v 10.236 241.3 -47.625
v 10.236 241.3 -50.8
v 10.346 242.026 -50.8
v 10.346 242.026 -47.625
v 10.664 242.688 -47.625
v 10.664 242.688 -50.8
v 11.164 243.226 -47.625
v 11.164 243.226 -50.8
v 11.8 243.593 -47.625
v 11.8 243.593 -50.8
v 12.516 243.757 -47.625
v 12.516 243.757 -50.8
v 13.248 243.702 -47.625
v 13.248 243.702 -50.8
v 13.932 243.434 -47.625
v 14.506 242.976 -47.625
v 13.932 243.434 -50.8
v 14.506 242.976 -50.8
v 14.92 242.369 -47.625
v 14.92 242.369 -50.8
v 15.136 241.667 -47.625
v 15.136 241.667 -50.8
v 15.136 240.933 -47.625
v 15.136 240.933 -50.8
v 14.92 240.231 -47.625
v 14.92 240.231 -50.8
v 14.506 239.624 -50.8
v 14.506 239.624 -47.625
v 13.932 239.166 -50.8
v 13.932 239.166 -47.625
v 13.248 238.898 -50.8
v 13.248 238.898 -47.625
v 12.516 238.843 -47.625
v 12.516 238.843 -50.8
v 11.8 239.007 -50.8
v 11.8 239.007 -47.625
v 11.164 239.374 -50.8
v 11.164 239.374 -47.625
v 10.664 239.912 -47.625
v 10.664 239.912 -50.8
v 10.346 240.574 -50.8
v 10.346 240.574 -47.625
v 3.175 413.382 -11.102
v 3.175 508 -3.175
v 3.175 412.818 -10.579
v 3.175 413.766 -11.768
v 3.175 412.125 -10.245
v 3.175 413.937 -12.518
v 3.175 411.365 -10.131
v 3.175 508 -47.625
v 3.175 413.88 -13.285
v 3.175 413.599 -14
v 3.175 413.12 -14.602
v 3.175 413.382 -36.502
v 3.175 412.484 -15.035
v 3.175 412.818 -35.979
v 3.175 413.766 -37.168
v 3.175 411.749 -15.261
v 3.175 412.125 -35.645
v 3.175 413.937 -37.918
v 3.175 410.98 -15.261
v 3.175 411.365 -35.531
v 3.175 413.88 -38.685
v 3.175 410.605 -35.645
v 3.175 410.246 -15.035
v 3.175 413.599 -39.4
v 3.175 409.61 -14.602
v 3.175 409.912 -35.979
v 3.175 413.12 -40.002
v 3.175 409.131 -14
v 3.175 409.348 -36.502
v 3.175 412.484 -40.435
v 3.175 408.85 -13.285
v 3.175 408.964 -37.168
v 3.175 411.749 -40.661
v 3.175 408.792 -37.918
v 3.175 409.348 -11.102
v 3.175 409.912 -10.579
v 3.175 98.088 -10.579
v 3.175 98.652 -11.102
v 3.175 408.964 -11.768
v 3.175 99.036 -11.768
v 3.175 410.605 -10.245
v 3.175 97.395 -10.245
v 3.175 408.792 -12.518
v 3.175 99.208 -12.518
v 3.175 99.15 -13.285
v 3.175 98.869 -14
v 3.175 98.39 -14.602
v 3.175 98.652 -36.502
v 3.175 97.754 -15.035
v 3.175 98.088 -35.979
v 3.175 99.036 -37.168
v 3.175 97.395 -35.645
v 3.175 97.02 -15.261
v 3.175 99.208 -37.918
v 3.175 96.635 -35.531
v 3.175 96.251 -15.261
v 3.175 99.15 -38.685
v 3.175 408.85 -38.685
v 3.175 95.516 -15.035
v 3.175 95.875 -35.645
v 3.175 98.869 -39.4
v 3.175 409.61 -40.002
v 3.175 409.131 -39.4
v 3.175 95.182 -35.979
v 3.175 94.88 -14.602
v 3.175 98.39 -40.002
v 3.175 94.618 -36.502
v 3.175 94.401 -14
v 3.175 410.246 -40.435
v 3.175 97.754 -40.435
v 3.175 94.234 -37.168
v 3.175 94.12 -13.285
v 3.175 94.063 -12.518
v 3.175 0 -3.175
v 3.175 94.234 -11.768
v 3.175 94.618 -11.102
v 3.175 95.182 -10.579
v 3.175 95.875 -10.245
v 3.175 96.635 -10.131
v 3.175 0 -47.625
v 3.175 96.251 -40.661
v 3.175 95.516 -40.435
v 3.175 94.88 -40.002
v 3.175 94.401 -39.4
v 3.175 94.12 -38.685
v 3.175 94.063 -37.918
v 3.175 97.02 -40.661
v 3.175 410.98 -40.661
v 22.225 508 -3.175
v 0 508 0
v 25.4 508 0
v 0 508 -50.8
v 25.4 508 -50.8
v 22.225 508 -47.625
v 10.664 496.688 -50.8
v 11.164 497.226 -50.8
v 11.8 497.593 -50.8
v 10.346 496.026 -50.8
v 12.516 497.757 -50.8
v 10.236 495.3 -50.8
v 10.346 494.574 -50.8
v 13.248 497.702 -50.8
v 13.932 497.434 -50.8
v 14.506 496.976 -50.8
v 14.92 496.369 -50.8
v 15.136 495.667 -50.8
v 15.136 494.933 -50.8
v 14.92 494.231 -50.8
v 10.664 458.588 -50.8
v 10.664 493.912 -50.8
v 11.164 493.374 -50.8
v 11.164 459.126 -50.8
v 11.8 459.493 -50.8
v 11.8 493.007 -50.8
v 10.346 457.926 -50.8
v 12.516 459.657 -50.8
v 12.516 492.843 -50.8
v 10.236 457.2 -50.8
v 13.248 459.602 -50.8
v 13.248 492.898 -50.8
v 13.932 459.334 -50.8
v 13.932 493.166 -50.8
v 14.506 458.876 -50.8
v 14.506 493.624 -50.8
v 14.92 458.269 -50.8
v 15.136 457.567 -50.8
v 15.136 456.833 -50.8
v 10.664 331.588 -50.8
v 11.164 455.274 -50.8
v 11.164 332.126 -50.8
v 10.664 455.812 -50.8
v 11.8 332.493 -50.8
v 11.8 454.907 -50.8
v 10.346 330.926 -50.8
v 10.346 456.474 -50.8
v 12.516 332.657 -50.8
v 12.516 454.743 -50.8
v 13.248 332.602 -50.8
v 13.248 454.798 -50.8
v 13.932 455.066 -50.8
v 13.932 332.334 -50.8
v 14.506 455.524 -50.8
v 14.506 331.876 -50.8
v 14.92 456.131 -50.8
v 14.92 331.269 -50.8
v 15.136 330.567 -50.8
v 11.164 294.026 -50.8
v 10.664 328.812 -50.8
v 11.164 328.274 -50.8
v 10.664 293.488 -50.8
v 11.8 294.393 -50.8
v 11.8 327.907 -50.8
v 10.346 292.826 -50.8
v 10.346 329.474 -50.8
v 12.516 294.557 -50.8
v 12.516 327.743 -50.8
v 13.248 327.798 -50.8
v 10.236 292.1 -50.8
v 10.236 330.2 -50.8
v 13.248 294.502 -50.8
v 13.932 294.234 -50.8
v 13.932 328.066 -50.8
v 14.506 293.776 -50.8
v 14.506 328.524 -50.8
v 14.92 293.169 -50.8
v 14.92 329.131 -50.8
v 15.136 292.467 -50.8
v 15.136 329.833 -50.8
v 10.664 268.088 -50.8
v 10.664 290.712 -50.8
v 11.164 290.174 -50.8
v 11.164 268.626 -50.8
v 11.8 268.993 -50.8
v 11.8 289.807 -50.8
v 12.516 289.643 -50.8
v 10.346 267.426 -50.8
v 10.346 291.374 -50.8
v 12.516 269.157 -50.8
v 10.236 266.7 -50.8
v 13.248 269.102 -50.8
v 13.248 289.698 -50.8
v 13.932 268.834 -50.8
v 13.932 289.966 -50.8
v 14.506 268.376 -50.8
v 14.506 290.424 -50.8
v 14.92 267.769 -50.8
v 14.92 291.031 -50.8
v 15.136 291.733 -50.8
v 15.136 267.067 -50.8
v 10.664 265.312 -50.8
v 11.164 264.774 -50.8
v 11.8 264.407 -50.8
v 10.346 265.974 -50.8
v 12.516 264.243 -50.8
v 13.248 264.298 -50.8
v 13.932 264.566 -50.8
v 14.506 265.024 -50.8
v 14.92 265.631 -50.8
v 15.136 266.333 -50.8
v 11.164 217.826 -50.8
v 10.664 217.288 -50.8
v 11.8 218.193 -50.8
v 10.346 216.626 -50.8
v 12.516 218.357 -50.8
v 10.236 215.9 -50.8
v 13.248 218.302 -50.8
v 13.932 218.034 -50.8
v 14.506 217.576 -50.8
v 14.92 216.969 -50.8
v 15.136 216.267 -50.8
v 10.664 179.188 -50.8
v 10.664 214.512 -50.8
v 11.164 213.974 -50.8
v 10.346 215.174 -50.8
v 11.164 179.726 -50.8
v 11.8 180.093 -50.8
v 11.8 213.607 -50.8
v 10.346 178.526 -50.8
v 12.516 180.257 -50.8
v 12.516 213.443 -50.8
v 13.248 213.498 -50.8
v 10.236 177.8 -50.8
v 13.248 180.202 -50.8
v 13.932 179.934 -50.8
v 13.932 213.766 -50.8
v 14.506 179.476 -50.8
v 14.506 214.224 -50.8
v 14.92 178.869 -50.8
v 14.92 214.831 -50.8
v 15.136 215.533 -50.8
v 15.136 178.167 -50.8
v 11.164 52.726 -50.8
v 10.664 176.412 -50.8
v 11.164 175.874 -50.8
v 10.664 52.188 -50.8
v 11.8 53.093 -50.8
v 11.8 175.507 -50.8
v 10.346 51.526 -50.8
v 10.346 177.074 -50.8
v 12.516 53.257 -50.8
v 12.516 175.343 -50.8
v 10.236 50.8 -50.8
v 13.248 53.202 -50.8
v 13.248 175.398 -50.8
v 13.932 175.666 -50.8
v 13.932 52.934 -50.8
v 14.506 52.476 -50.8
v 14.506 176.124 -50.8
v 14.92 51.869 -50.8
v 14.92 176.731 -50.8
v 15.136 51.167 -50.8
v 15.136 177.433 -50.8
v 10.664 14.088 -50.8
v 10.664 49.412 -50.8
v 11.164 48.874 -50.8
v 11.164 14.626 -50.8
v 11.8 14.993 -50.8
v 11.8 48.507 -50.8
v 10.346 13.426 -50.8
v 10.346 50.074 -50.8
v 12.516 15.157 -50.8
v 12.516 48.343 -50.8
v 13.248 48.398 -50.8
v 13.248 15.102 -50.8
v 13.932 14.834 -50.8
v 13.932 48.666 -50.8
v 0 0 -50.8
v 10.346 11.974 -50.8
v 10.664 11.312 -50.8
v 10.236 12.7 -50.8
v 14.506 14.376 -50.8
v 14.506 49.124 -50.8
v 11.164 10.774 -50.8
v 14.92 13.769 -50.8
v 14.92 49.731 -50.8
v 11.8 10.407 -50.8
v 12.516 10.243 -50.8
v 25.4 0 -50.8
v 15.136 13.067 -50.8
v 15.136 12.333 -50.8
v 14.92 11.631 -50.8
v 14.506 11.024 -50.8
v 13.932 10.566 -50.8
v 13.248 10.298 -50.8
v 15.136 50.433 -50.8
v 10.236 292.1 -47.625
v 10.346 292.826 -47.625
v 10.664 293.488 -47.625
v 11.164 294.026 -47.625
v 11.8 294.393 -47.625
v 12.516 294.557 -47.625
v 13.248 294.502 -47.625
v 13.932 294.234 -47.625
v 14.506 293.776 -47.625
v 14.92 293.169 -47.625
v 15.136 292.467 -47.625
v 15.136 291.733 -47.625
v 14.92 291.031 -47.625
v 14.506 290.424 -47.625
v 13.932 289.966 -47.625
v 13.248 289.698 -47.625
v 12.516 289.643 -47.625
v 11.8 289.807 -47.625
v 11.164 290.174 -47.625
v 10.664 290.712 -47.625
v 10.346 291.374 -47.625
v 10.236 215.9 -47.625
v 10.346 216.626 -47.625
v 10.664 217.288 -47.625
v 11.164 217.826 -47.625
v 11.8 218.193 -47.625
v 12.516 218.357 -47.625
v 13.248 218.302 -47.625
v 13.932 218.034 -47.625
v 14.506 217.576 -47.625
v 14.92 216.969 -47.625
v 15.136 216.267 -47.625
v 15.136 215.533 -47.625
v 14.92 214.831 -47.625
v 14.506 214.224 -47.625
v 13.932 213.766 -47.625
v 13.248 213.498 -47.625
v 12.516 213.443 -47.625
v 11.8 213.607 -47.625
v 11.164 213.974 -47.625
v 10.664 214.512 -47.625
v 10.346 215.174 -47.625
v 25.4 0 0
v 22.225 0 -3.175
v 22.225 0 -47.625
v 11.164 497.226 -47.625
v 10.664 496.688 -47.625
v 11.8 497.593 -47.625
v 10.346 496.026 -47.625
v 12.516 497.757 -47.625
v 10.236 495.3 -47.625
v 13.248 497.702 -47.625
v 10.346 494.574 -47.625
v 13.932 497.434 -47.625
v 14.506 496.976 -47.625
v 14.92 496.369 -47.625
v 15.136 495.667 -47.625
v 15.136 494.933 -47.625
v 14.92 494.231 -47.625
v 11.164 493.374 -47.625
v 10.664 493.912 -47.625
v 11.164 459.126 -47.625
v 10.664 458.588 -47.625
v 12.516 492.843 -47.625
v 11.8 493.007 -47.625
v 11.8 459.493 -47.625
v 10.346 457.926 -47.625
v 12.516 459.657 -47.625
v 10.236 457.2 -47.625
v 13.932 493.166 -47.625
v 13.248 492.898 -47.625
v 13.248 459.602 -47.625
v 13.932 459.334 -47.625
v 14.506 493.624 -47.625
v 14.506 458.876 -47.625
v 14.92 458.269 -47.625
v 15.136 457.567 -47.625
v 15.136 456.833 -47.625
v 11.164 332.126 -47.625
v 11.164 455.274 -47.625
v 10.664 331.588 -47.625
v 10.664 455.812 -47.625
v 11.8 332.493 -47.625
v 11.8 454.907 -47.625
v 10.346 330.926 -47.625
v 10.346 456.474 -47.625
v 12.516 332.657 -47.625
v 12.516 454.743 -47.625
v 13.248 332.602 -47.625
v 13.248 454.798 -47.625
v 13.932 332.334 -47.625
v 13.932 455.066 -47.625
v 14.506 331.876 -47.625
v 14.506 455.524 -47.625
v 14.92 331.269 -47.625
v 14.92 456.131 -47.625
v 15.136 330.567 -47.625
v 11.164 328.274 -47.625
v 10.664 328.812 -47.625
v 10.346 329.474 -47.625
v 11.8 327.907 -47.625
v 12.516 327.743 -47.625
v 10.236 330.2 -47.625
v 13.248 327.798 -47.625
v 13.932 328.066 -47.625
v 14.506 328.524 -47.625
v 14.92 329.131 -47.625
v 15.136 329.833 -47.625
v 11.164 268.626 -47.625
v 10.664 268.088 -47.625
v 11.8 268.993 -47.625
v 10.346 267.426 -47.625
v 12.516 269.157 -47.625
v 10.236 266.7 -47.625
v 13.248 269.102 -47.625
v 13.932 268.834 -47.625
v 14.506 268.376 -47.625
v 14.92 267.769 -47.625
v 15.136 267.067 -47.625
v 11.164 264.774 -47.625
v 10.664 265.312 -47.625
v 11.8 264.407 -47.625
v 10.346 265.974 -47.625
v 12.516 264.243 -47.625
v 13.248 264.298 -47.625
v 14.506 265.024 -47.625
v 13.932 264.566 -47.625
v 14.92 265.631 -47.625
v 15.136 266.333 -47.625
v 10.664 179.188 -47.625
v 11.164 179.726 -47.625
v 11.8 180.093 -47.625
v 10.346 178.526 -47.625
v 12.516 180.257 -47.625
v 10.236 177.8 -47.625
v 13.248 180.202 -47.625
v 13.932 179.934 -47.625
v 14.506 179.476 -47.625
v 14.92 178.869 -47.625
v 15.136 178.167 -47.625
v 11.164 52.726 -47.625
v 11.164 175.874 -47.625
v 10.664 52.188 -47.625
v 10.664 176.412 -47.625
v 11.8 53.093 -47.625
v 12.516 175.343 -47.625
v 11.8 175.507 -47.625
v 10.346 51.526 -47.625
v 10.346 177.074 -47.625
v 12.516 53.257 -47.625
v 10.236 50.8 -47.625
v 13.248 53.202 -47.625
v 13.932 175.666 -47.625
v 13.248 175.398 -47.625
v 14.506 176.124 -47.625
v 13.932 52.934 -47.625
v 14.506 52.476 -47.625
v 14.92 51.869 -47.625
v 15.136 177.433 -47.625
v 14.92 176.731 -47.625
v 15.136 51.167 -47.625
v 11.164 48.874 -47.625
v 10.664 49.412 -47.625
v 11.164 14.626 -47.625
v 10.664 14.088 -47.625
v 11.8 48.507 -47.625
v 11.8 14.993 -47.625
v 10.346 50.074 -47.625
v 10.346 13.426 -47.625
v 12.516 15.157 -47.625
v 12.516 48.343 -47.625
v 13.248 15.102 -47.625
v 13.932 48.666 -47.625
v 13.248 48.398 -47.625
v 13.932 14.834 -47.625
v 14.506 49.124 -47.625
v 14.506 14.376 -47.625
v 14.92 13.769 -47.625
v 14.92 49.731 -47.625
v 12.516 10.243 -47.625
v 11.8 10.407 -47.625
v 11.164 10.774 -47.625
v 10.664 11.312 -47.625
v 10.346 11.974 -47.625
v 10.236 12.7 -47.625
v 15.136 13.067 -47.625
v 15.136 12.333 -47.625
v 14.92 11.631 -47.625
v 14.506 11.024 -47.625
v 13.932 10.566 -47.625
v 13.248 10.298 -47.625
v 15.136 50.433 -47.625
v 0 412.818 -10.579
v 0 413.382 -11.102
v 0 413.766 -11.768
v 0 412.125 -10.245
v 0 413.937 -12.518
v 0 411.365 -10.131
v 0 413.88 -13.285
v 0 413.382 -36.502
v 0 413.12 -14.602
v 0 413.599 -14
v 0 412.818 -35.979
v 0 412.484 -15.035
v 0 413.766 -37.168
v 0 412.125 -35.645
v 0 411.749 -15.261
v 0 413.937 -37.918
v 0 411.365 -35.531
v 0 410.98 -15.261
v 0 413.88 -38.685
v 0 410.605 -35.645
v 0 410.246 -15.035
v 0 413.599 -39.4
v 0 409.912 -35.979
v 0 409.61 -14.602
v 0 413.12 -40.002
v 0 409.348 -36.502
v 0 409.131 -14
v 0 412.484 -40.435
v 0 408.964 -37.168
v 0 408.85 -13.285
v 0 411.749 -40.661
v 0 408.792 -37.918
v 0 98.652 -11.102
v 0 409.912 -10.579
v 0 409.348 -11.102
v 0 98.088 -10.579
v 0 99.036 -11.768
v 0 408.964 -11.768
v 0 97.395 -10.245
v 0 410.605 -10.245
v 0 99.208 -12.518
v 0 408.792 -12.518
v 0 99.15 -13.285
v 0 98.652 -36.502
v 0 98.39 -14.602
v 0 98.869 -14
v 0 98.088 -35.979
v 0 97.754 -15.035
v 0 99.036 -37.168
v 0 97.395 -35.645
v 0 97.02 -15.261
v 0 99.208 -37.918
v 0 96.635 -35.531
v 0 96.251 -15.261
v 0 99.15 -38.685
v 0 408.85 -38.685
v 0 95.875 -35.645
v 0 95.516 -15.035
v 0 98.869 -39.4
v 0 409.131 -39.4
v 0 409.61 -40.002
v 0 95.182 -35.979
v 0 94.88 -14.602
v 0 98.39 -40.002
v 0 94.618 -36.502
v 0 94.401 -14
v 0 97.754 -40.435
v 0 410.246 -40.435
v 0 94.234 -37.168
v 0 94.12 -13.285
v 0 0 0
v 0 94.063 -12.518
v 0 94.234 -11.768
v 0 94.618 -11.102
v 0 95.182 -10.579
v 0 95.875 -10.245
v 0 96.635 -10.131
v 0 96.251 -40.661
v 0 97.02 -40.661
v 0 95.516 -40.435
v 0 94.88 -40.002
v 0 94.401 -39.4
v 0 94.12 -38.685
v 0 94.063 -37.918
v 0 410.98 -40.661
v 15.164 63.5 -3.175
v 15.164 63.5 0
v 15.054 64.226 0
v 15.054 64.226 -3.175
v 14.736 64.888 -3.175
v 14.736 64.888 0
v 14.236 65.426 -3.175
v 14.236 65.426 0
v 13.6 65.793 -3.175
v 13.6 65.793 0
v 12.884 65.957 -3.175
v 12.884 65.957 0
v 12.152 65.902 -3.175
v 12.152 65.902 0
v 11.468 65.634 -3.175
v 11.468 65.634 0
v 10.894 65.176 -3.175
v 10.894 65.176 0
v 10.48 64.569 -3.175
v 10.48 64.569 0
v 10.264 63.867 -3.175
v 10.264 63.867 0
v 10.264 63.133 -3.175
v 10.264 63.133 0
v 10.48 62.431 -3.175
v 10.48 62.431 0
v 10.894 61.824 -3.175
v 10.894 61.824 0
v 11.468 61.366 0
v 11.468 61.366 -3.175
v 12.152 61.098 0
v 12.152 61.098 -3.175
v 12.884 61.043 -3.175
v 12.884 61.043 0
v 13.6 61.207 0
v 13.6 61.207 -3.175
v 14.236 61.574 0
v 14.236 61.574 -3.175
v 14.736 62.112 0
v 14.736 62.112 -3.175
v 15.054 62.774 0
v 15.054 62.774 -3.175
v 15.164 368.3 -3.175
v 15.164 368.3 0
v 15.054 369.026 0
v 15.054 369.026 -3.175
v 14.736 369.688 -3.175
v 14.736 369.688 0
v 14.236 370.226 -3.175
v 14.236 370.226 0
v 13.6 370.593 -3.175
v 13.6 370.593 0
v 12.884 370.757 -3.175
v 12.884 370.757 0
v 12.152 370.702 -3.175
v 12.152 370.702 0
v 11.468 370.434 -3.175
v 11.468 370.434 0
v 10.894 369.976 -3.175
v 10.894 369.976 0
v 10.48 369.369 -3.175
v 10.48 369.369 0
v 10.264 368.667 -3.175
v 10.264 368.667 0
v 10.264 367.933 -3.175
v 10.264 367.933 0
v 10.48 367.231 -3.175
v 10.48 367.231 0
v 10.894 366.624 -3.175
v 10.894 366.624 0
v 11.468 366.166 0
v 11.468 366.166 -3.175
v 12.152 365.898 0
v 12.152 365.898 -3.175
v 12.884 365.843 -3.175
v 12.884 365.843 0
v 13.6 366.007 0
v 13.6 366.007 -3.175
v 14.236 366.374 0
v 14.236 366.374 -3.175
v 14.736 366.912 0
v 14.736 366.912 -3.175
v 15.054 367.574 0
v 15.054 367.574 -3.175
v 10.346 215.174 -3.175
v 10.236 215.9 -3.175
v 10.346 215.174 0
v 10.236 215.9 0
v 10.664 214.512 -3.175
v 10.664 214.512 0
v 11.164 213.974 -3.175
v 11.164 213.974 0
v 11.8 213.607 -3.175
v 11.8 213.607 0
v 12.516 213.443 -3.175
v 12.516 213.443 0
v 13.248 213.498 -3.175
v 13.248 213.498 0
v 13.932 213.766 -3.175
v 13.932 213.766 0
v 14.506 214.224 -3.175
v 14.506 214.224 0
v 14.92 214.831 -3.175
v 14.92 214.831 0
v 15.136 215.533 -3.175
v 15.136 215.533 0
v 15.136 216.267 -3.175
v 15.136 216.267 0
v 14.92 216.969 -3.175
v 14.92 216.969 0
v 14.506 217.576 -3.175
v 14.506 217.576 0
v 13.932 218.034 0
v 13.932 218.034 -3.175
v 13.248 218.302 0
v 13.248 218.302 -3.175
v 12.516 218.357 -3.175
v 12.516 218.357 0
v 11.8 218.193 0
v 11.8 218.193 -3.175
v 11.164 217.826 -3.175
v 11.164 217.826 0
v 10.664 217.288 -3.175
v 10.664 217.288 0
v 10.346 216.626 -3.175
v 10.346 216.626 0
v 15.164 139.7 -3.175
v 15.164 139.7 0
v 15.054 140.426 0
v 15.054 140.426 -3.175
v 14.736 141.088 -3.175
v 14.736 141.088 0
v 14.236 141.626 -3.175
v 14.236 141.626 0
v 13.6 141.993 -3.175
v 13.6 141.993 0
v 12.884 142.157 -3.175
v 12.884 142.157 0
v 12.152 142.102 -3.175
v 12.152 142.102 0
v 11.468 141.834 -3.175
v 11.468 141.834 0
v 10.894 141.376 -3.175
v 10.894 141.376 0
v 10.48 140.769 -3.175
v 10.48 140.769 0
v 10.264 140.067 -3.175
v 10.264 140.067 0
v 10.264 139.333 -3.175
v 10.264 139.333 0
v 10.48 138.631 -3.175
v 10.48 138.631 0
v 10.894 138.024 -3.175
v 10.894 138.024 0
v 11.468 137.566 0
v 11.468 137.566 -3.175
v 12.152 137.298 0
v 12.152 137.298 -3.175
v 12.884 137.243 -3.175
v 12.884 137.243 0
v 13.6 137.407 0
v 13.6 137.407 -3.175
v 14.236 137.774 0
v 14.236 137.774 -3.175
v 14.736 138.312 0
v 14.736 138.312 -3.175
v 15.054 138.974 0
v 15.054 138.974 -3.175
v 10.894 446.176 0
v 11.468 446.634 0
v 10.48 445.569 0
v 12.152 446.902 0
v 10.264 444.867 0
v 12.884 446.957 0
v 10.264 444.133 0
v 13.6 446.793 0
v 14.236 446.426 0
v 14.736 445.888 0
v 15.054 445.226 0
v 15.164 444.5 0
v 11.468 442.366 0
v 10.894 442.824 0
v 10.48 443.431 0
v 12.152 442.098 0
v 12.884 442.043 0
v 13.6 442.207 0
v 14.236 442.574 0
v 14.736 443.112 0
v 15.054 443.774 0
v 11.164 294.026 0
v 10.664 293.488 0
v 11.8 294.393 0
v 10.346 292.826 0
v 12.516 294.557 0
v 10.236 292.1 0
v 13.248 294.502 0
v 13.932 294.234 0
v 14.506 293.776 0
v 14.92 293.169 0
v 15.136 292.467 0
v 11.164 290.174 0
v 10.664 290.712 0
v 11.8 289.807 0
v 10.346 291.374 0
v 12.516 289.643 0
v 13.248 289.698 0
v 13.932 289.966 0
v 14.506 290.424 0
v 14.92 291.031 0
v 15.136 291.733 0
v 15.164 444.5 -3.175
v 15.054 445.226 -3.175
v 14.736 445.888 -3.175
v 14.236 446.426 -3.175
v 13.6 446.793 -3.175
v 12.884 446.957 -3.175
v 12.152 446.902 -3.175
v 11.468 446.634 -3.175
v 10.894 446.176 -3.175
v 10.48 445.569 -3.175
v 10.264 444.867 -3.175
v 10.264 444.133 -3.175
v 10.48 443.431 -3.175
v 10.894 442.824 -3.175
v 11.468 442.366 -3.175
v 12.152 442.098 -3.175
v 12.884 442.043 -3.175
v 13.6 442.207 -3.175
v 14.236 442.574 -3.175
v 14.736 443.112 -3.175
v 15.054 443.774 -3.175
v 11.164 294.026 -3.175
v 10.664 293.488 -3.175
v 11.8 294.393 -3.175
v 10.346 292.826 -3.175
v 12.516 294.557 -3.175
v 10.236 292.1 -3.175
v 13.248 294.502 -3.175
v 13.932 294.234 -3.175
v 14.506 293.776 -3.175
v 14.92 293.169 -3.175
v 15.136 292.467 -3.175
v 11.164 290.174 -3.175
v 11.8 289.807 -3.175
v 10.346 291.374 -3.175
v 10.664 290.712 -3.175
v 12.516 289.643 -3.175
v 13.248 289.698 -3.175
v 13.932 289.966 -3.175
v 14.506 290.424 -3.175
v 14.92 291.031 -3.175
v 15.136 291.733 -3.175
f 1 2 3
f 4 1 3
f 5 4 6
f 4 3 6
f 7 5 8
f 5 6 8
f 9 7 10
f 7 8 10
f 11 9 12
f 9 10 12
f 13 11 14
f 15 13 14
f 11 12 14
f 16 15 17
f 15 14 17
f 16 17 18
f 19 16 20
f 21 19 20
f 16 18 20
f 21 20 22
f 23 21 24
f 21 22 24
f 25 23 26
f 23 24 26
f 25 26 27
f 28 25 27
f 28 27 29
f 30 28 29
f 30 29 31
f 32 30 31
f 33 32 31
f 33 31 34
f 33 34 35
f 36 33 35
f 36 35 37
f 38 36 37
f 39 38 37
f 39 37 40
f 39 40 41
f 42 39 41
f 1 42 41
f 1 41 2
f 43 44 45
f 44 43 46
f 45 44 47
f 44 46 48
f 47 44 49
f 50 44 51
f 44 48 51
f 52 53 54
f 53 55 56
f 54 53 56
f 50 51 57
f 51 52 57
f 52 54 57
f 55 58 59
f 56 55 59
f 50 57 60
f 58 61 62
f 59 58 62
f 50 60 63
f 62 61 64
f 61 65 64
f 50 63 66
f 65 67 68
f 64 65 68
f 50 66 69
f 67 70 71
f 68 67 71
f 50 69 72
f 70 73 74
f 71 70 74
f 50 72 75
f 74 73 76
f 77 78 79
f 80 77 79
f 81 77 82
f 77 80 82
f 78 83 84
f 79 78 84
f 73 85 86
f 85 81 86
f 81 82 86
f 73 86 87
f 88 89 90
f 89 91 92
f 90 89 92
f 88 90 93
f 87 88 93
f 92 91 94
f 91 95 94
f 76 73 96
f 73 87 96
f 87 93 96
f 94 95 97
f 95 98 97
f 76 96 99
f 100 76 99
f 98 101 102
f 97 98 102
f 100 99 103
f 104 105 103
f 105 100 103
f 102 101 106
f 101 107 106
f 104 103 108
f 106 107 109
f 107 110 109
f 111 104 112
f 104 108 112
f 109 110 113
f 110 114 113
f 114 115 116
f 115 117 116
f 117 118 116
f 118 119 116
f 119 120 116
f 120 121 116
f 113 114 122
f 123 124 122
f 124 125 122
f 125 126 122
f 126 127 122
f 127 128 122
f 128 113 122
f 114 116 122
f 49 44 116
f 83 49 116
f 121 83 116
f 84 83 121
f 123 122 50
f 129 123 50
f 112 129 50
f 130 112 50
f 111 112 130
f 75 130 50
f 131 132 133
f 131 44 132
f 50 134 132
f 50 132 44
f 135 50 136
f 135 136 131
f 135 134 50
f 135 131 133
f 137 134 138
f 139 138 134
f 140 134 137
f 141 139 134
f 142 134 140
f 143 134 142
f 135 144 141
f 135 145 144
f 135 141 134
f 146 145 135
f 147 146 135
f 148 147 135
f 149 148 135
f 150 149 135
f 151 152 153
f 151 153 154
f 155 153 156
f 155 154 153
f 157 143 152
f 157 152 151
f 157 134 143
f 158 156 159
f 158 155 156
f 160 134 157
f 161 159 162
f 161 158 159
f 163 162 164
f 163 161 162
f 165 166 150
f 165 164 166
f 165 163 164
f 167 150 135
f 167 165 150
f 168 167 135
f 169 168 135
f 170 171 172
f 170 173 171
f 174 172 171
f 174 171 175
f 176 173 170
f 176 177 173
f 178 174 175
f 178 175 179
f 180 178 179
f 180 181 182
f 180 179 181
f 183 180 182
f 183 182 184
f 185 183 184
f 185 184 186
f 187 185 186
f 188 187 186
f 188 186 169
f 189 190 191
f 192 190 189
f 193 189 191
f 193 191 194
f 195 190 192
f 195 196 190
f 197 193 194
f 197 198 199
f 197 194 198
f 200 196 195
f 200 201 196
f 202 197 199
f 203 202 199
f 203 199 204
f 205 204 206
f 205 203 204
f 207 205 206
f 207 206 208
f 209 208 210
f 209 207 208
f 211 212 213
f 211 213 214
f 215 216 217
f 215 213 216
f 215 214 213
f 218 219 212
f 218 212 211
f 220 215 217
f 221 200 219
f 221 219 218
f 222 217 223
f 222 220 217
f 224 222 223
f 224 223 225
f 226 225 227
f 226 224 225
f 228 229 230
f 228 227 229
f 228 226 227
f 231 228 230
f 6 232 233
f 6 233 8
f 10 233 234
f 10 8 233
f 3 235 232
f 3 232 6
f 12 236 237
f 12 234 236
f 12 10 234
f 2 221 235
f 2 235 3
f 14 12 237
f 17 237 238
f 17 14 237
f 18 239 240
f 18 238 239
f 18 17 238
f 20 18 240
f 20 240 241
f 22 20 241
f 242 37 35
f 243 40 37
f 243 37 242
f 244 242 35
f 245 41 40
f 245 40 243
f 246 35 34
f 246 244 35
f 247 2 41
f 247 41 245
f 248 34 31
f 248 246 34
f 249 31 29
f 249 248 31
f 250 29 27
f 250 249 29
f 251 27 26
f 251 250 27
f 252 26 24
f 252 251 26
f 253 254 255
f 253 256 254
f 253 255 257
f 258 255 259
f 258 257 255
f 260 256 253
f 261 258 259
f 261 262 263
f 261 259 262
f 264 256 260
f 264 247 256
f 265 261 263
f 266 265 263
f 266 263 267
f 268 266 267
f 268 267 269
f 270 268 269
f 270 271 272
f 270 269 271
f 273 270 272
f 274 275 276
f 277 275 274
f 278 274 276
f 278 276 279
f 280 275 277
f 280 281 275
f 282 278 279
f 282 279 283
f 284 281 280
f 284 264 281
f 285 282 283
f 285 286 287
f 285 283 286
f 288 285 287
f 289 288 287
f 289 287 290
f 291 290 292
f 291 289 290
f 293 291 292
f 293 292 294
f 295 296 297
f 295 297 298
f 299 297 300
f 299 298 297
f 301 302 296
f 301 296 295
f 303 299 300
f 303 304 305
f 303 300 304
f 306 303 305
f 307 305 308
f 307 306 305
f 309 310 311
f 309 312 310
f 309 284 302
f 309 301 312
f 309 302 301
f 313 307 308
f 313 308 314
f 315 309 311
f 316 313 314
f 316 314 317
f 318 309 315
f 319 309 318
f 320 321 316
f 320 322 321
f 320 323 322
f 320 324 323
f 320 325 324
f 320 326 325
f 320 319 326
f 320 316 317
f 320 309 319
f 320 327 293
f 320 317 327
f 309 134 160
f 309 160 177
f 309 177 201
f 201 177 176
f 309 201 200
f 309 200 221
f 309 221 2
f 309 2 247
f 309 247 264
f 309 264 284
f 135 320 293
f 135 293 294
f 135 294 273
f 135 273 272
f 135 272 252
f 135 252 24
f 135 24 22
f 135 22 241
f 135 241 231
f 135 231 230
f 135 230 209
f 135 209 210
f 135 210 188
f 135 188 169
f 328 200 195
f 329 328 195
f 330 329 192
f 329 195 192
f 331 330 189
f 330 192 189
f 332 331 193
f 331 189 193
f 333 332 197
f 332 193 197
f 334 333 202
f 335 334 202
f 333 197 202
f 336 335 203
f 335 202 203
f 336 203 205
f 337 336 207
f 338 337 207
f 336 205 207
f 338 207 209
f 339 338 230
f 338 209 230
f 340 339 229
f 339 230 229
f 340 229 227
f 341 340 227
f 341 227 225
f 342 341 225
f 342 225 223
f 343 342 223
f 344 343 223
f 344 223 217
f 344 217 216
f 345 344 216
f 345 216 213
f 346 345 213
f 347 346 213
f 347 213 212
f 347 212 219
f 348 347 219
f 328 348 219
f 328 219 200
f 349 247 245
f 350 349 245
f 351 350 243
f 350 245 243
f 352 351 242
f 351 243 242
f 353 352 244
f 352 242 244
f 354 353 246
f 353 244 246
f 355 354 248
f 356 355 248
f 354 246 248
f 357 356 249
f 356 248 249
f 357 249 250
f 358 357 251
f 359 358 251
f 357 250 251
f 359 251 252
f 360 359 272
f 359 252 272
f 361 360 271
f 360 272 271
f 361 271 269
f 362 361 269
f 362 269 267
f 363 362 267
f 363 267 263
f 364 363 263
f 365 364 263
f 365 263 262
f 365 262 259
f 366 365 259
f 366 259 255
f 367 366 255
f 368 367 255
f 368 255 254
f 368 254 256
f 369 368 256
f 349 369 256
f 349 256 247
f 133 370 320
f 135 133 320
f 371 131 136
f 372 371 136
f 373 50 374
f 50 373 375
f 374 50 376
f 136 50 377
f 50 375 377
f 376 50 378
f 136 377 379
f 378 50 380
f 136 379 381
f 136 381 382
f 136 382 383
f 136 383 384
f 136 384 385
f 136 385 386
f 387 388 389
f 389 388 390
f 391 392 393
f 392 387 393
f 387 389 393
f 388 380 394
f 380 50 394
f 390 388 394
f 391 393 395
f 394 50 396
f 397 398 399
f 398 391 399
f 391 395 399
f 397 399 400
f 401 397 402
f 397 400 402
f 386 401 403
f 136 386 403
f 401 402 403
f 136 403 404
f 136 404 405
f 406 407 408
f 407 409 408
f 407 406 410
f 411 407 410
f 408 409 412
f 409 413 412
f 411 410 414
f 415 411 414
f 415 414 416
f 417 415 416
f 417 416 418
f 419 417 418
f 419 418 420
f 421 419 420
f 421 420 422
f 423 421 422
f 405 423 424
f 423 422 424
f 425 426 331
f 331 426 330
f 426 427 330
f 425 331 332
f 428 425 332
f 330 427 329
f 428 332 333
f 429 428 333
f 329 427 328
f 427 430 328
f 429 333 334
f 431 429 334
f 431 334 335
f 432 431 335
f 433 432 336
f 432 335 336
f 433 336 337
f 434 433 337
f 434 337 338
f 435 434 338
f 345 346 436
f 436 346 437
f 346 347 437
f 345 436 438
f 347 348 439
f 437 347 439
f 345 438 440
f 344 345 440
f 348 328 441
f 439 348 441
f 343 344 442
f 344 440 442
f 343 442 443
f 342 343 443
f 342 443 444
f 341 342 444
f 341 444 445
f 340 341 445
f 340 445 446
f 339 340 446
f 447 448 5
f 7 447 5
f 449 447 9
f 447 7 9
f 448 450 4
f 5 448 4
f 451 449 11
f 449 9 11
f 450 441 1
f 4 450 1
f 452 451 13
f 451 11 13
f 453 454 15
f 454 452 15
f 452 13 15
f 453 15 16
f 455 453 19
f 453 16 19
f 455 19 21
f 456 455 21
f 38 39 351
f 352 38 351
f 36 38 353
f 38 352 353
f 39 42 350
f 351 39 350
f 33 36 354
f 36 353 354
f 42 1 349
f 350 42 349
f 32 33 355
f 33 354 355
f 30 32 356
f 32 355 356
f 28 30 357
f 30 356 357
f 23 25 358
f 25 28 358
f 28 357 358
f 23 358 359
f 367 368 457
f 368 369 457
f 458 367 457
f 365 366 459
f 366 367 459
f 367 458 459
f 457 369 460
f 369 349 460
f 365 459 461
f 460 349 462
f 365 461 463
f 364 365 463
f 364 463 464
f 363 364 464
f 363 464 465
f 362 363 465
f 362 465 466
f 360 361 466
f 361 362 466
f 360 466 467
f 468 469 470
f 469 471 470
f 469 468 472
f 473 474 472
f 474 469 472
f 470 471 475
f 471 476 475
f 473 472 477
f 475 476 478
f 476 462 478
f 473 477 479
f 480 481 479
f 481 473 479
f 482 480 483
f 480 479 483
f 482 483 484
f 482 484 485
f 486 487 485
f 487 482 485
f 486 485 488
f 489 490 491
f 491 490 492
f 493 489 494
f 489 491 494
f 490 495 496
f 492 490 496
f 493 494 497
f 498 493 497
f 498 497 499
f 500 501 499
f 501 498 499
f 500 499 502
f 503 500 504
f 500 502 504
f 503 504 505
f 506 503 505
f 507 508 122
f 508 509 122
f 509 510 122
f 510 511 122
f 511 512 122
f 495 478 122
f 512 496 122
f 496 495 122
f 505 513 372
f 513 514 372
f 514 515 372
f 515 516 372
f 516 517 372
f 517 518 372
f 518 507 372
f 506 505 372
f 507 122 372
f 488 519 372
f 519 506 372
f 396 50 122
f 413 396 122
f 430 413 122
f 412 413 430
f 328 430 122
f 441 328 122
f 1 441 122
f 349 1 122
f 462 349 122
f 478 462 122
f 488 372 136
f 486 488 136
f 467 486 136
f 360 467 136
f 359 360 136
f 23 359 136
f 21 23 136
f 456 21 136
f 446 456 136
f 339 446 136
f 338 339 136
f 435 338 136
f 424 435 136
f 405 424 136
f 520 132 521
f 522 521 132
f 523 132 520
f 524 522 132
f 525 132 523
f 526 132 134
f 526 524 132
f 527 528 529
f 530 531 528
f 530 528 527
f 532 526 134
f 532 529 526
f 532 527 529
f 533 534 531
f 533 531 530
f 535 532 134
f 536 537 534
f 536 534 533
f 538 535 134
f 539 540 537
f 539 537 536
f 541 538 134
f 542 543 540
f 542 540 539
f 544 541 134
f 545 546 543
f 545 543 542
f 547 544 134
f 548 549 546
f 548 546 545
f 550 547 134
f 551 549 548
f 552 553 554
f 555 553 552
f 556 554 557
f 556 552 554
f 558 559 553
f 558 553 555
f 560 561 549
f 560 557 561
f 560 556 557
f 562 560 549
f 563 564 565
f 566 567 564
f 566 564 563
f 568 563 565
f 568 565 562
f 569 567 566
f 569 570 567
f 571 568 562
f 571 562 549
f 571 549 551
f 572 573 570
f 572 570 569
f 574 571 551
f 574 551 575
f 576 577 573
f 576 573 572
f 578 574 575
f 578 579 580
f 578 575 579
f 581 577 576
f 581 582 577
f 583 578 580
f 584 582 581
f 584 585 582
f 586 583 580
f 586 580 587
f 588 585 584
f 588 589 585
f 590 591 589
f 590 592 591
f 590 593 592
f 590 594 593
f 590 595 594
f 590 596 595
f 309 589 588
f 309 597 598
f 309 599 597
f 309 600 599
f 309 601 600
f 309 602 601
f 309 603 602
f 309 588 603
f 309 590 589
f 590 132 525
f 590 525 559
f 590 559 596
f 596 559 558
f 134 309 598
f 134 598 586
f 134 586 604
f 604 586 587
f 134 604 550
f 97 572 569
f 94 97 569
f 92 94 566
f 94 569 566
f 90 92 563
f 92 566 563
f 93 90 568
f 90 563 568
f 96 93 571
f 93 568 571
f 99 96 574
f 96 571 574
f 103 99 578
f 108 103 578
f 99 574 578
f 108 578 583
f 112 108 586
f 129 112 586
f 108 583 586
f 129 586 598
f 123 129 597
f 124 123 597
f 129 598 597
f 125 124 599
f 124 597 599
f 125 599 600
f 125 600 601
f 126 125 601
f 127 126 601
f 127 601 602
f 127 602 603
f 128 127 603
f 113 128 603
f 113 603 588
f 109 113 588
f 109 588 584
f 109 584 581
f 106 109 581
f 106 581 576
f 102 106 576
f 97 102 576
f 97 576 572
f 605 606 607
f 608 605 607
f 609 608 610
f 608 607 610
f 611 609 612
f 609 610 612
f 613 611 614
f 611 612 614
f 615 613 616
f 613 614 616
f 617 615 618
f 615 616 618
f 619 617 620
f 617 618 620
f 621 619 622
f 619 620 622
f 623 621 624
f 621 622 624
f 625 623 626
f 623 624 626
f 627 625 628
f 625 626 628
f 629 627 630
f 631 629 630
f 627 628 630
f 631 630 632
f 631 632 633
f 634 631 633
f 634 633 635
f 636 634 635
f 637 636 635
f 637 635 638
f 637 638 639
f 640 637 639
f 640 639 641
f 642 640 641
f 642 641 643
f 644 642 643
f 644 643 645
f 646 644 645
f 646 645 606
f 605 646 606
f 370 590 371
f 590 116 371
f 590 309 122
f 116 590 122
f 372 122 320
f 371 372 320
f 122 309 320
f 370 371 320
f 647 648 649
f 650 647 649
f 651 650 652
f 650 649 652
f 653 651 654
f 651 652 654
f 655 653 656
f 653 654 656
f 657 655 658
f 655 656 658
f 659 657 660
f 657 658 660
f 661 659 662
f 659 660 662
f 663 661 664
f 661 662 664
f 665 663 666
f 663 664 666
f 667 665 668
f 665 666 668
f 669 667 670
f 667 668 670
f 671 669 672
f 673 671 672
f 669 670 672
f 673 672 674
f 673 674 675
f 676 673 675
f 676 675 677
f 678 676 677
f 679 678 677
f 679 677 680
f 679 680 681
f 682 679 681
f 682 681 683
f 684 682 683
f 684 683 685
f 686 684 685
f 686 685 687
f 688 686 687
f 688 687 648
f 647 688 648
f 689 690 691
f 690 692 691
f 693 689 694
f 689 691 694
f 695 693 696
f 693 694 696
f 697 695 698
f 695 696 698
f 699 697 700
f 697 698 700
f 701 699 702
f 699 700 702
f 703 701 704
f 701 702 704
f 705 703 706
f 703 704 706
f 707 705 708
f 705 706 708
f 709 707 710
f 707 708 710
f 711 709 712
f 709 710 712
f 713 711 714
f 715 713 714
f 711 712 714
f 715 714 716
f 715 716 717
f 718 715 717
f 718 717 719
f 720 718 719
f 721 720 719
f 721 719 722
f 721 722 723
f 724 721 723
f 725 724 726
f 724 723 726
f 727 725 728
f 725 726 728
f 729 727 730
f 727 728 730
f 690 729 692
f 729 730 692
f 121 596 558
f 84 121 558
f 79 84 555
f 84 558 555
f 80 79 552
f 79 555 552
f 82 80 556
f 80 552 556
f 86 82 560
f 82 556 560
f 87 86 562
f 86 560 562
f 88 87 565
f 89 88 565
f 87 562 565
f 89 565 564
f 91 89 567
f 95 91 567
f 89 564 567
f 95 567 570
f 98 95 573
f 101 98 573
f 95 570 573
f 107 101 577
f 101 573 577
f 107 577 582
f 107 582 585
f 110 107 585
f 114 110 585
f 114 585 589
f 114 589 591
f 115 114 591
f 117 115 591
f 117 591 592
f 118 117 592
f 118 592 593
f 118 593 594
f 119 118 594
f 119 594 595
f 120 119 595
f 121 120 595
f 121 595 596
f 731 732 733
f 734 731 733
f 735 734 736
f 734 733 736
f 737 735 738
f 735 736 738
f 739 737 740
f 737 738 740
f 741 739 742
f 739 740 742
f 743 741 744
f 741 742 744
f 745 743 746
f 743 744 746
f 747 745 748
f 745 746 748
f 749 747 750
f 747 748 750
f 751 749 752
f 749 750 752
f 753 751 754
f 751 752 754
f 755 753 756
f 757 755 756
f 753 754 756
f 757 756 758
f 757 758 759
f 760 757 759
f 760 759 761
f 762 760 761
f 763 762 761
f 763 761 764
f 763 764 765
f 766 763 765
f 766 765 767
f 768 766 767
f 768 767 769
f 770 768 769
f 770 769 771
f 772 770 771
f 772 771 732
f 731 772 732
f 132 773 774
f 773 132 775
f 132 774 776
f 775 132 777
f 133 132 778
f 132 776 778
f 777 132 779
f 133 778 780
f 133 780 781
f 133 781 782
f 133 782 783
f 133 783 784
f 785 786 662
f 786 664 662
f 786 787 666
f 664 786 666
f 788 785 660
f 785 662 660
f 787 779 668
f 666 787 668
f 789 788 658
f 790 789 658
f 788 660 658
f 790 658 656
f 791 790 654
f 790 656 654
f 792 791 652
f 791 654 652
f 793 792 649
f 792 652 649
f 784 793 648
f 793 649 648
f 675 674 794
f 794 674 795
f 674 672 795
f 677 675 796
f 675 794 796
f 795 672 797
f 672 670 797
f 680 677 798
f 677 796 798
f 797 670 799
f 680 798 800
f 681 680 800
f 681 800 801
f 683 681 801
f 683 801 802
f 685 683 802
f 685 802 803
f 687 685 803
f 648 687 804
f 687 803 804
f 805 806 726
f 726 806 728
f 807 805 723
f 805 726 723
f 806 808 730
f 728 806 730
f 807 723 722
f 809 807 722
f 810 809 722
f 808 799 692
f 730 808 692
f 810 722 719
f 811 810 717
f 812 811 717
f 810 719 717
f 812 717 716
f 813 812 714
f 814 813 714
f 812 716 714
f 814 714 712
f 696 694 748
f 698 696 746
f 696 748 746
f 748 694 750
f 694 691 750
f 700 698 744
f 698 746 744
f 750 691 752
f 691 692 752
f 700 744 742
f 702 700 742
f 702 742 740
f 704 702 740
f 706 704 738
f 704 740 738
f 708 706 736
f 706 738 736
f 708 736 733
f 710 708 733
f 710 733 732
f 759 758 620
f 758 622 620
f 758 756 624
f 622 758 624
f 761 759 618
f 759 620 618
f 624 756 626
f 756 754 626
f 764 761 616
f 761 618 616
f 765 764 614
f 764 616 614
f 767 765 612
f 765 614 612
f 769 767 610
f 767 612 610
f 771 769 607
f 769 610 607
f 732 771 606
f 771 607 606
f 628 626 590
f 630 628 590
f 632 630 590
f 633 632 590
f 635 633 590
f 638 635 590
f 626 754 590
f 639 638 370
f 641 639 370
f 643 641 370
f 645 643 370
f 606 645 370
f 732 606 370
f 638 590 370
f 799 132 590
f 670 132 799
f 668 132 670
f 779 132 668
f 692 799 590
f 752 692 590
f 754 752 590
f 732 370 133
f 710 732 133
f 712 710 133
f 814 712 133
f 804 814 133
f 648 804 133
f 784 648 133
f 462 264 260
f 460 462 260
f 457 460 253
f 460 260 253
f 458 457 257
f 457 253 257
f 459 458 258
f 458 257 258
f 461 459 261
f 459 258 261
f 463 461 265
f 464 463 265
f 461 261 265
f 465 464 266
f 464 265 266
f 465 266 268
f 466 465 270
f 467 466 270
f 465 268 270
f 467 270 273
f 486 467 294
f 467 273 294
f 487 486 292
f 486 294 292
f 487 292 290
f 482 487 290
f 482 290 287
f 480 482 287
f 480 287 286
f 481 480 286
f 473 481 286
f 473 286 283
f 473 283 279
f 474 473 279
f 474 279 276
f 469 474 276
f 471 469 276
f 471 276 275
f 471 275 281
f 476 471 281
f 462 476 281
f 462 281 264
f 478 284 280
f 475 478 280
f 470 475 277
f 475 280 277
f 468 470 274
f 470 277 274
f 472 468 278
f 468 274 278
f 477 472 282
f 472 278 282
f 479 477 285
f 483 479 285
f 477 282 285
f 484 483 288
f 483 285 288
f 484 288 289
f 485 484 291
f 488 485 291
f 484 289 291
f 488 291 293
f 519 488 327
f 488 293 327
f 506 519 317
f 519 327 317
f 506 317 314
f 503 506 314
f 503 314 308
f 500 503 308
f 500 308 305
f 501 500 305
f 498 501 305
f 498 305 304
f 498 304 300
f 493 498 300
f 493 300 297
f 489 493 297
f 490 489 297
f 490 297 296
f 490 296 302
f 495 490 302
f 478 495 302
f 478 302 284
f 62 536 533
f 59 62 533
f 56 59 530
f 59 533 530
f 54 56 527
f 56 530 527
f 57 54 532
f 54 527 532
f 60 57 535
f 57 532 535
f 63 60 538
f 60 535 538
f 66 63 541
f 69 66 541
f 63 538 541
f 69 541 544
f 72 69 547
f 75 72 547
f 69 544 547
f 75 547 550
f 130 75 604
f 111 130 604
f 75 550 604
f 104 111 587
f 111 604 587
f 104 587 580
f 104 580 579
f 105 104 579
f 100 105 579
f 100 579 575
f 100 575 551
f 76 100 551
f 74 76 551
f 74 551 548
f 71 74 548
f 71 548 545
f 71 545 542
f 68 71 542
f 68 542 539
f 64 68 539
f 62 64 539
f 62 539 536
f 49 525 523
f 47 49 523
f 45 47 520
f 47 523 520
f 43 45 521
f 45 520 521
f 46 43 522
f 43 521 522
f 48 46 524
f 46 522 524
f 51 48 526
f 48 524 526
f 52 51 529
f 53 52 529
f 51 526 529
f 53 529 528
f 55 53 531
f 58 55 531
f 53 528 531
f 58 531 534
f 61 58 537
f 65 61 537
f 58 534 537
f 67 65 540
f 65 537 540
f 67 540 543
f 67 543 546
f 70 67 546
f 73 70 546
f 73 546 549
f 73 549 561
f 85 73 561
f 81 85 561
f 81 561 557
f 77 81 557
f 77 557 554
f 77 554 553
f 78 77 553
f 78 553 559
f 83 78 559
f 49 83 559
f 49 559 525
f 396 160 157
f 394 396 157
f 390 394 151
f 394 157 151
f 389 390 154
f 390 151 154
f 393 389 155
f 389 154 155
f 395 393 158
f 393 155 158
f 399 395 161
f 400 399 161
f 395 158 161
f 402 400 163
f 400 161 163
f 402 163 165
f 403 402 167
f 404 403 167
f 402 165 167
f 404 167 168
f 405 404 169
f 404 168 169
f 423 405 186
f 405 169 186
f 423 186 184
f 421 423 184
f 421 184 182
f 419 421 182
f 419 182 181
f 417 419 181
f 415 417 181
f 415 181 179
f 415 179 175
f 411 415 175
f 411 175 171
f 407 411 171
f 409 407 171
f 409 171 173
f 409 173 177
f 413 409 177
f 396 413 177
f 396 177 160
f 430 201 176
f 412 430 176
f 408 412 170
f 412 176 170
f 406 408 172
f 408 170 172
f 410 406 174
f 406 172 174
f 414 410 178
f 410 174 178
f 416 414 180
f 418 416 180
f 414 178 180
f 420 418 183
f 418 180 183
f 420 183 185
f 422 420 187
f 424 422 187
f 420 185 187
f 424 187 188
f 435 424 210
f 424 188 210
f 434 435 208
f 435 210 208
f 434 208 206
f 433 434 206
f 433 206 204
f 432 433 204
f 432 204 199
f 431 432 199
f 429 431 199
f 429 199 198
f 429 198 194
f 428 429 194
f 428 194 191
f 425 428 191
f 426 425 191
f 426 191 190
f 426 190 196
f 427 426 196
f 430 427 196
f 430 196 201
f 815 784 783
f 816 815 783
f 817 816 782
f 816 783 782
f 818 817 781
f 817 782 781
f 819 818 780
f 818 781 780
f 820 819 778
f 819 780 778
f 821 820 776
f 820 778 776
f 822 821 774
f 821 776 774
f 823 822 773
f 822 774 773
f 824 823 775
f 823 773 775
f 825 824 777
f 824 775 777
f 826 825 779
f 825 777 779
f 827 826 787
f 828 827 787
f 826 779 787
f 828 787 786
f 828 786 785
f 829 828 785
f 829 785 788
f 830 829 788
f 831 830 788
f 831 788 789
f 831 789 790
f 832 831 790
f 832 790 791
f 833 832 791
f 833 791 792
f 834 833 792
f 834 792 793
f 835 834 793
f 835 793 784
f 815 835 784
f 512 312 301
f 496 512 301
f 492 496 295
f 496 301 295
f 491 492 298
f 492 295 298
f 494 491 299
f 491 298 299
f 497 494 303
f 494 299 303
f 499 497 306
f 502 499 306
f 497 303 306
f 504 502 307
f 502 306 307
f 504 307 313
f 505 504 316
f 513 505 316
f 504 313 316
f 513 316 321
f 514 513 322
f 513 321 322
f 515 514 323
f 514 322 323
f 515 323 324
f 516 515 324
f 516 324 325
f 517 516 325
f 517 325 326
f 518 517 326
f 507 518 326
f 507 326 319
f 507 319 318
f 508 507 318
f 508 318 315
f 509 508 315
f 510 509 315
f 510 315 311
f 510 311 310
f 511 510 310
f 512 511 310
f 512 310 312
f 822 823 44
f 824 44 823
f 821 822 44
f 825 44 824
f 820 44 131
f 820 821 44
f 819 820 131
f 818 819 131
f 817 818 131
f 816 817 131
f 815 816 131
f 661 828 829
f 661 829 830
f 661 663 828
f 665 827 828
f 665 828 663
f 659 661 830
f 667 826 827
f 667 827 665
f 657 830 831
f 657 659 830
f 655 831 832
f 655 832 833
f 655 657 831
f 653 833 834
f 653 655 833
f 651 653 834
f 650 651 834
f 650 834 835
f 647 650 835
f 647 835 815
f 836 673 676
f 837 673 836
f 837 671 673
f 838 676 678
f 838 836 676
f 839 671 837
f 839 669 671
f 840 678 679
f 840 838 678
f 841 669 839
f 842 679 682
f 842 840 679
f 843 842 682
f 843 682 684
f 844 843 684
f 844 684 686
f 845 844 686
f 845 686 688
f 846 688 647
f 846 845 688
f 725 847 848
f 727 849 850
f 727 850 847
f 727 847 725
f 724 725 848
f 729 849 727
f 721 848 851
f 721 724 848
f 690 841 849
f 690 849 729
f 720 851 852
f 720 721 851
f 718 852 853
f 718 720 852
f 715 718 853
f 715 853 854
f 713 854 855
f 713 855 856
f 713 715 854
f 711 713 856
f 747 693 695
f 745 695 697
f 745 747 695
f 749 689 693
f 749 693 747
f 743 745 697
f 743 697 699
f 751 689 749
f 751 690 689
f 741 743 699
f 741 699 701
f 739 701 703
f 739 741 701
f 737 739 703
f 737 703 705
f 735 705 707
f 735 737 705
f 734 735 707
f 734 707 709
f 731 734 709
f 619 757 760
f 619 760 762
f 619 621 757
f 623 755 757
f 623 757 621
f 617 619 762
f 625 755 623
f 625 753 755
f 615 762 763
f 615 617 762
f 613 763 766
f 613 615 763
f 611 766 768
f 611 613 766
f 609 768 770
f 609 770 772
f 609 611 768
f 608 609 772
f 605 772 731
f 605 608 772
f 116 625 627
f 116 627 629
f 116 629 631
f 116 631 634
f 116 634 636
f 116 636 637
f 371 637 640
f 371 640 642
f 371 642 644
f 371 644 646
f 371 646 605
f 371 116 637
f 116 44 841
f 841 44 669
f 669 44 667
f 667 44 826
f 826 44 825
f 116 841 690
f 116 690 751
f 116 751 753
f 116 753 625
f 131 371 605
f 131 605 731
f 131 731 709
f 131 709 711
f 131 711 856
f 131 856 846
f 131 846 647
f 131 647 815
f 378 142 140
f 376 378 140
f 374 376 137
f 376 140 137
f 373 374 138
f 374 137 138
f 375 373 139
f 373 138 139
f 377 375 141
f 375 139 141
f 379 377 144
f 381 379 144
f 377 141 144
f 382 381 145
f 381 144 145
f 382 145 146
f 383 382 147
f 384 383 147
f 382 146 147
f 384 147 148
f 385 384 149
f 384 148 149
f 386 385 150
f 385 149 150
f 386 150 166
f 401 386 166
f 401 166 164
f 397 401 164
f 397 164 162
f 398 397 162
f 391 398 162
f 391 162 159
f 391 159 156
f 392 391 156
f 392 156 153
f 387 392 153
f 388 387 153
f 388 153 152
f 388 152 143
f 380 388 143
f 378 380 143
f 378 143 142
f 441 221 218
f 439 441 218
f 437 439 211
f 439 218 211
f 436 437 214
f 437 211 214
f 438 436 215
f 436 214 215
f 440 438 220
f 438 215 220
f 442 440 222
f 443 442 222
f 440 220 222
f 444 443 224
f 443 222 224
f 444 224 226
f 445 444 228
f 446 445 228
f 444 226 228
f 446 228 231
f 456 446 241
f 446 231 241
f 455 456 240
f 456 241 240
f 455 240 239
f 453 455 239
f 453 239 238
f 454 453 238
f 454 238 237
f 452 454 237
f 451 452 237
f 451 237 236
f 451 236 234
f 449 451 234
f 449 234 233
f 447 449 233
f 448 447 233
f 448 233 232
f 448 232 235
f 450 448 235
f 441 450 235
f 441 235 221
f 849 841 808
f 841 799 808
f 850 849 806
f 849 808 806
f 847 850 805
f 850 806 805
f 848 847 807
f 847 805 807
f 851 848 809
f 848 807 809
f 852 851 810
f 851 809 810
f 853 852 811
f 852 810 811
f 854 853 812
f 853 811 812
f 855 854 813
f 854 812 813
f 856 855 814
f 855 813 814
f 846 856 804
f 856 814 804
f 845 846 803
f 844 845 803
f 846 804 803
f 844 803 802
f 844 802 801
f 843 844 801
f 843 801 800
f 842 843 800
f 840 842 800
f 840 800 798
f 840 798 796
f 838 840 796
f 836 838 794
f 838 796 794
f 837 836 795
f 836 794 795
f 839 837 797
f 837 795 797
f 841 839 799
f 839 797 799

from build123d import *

# Parameters (mm, degrees)
SKETCH1_W           = 25.4
SKETCH1_H           = 50.8
SKETCH1_W_2         = 19.05
SKETCH1_H_2         = 44.45
BOSS_EXTRUDE1_DEPTH = 508
CUT_EXTRUDE1_REACH  = 513.165
SKETCH2_R           = 2.4638
CUT_EXTRUDE2_REACH  = 513.165
SKETCH3_R           = 2.4638
CUT_EXTRUDE3_REACH  = 513.165
SKETCH4_R           = 2.5796875


with BuildPart() as part:
    # Sketch1 → Boss-Extrude1 (new body)
    with BuildSketch(Plane(origin=(0, 0, 0), x_dir=(1, 0, 0), z_dir=(0, 1, 0))):
        with Locations((12.7, 25.4)):
            Rectangle(SKETCH1_W, SKETCH1_H)
        with Locations((12.7, 25.4)):
            Rectangle(SKETCH1_W_2, SKETCH1_H_2, mode=Mode.SUBTRACT)
    extrude(amount=BOSS_EXTRUDE1_DEPTH)

    # Sketch2 → Cut-Extrude1 (cut, up to next)
    with BuildSketch(Plane(origin=(0, 0, -50.8), x_dir=(-1, 0, 0), z_dir=(0, 0, -1)), mode=Mode.PRIVATE) as cut_extrude1_sk1:
        with Locations((-12.7, 12.7)):
            Circle(SKETCH2_R)
    cut_extrude1_tool1 = extrude(cut_extrude1_sk1.sketch, amount=-CUT_EXTRUDE1_REACH, mode=Mode.PRIVATE) & part.part
    # Sketch2 → Cut-Extrude1 (cut, up to next)
    with BuildSketch(Plane(origin=(0, 0, -50.8), x_dir=(-1, 0, 0), z_dir=(0, 0, -1)), mode=Mode.PRIVATE) as cut_extrude1_sk2:
        with Locations((-12.7, 50.8)):
            Circle(SKETCH2_R)
    cut_extrude1_tool2 = extrude(cut_extrude1_sk2.sketch, amount=-CUT_EXTRUDE1_REACH, mode=Mode.PRIVATE) & part.part
    # Sketch2 → Cut-Extrude1 (cut, up to next)
    with BuildSketch(Plane(origin=(0, 0, -50.8), x_dir=(-1, 0, 0), z_dir=(0, 0, -1)), mode=Mode.PRIVATE) as cut_extrude1_sk3:
        with Locations((-12.7, 177.8)):
            Circle(SKETCH2_R)
    cut_extrude1_tool3 = extrude(cut_extrude1_sk3.sketch, amount=-CUT_EXTRUDE1_REACH, mode=Mode.PRIVATE) & part.part
    # Sketch2 → Cut-Extrude1 (cut, up to next)
    with BuildSketch(Plane(origin=(0, 0, -50.8), x_dir=(-1, 0, 0), z_dir=(0, 0, -1)), mode=Mode.PRIVATE) as cut_extrude1_sk4:
        with Locations((-12.7, 215.9)):
            Circle(SKETCH2_R)
    cut_extrude1_tool4 = extrude(cut_extrude1_sk4.sketch, amount=-CUT_EXTRUDE1_REACH, mode=Mode.PRIVATE) & part.part
    # Sketch2 → Cut-Extrude1 (cut, up to next)
    with BuildSketch(Plane(origin=(0, 0, -50.8), x_dir=(-1, 0, 0), z_dir=(0, 0, -1)), mode=Mode.PRIVATE) as cut_extrude1_sk5:
        with Locations((-12.7, 241.3)):
            Circle(SKETCH2_R)
    cut_extrude1_tool5 = extrude(cut_extrude1_sk5.sketch, amount=-CUT_EXTRUDE1_REACH, mode=Mode.PRIVATE) & part.part
    # Sketch2 → Cut-Extrude1 (cut, up to next)
    with BuildSketch(Plane(origin=(0, 0, -50.8), x_dir=(-1, 0, 0), z_dir=(0, 0, -1)), mode=Mode.PRIVATE) as cut_extrude1_sk6:
        with Locations((-12.7, 266.7)):
            Circle(SKETCH2_R)
    cut_extrude1_tool6 = extrude(cut_extrude1_sk6.sketch, amount=-CUT_EXTRUDE1_REACH, mode=Mode.PRIVATE) & part.part
    # Sketch2 → Cut-Extrude1 (cut, up to next)
    with BuildSketch(Plane(origin=(0, 0, -50.8), x_dir=(-1, 0, 0), z_dir=(0, 0, -1)), mode=Mode.PRIVATE) as cut_extrude1_sk7:
        with Locations((-12.7, 292.1)):
            Circle(SKETCH2_R)
    cut_extrude1_tool7 = extrude(cut_extrude1_sk7.sketch, amount=-CUT_EXTRUDE1_REACH, mode=Mode.PRIVATE) & part.part
    # Sketch2 → Cut-Extrude1 (cut, up to next)
    with BuildSketch(Plane(origin=(0, 0, -50.8), x_dir=(-1, 0, 0), z_dir=(0, 0, -1)), mode=Mode.PRIVATE) as cut_extrude1_sk8:
        with Locations((-12.7, 330.2)):
            Circle(SKETCH2_R)
    cut_extrude1_tool8 = extrude(cut_extrude1_sk8.sketch, amount=-CUT_EXTRUDE1_REACH, mode=Mode.PRIVATE) & part.part
    # Sketch2 → Cut-Extrude1 (cut, up to next)
    with BuildSketch(Plane(origin=(0, 0, -50.8), x_dir=(-1, 0, 0), z_dir=(0, 0, -1)), mode=Mode.PRIVATE) as cut_extrude1_sk9:
        with Locations((-12.7, 457.2)):
            Circle(SKETCH2_R)
    cut_extrude1_tool9 = extrude(cut_extrude1_sk9.sketch, amount=-CUT_EXTRUDE1_REACH, mode=Mode.PRIVATE) & part.part
    # Sketch2 → Cut-Extrude1 (cut, up to next)
    with BuildSketch(Plane(origin=(0, 0, -50.8), x_dir=(-1, 0, 0), z_dir=(0, 0, -1)), mode=Mode.PRIVATE) as cut_extrude1_sk10:
        with Locations((-12.7, 495.3)):
            Circle(SKETCH2_R)
    cut_extrude1_tool10 = extrude(cut_extrude1_sk10.sketch, amount=-CUT_EXTRUDE1_REACH, mode=Mode.PRIVATE) & part.part
    add(cut_extrude1_tool1.solids().sort_by_distance((12.7, 12.7, -50.8))[0], mode=Mode.SUBTRACT)
    add(cut_extrude1_tool2.solids().sort_by_distance((12.7, 50.8, -50.8))[0], mode=Mode.SUBTRACT)
    add(cut_extrude1_tool3.solids().sort_by_distance((12.7, 177.8, -50.8))[0], mode=Mode.SUBTRACT)
    add(cut_extrude1_tool4.solids().sort_by_distance((12.7, 215.9, -50.8))[0], mode=Mode.SUBTRACT)
    add(cut_extrude1_tool5.solids().sort_by_distance((12.7, 241.3, -50.8))[0], mode=Mode.SUBTRACT)
    add(cut_extrude1_tool6.solids().sort_by_distance((12.7, 266.7, -50.8))[0], mode=Mode.SUBTRACT)
    add(cut_extrude1_tool7.solids().sort_by_distance((12.7, 292.1, -50.8))[0], mode=Mode.SUBTRACT)
    add(cut_extrude1_tool8.solids().sort_by_distance((12.7, 330.2, -50.8))[0], mode=Mode.SUBTRACT)
    add(cut_extrude1_tool9.solids().sort_by_distance((12.7, 457.2, -50.8))[0], mode=Mode.SUBTRACT)
    add(cut_extrude1_tool10.solids().sort_by_distance((12.7, 495.3, -50.8))[0], mode=Mode.SUBTRACT)

    # Sketch3 → Cut-Extrude2 (cut, up to next)
    with BuildSketch(Plane.XY, mode=Mode.PRIVATE) as cut_extrude2_sk1:
        with Locations((12.7, 63.5)):
            Circle(SKETCH3_R)
    cut_extrude2_tool1 = extrude(cut_extrude2_sk1.sketch, amount=-CUT_EXTRUDE2_REACH, mode=Mode.PRIVATE) & part.part
    # Sketch3 → Cut-Extrude2 (cut, up to next)
    with BuildSketch(Plane.XY, mode=Mode.PRIVATE) as cut_extrude2_sk2:
        with Locations((12.7, 139.7)):
            Circle(SKETCH3_R)
    cut_extrude2_tool2 = extrude(cut_extrude2_sk2.sketch, amount=-CUT_EXTRUDE2_REACH, mode=Mode.PRIVATE) & part.part
    # Sketch3 → Cut-Extrude2 (cut, up to next)
    with BuildSketch(Plane.XY, mode=Mode.PRIVATE) as cut_extrude2_sk3:
        with Locations(Location((12.7, 215.9, 0), (0, 0, 180))):
            Circle(SKETCH3_R)
    cut_extrude2_tool3 = extrude(cut_extrude2_sk3.sketch, amount=-CUT_EXTRUDE2_REACH, mode=Mode.PRIVATE) & part.part
    # Sketch3 → Cut-Extrude2 (cut, up to next)
    with BuildSketch(Plane.XY, mode=Mode.PRIVATE) as cut_extrude2_sk4:
        with Locations(Location((12.7, 292.1, 0), (0, 0, 180))):
            Circle(SKETCH3_R)
    cut_extrude2_tool4 = extrude(cut_extrude2_sk4.sketch, amount=-CUT_EXTRUDE2_REACH, mode=Mode.PRIVATE) & part.part
    # Sketch3 → Cut-Extrude2 (cut, up to next)
    with BuildSketch(Plane.XY, mode=Mode.PRIVATE) as cut_extrude2_sk5:
        with Locations((12.7, 368.3)):
            Circle(SKETCH3_R)
    cut_extrude2_tool5 = extrude(cut_extrude2_sk5.sketch, amount=-CUT_EXTRUDE2_REACH, mode=Mode.PRIVATE) & part.part
    # Sketch3 → Cut-Extrude2 (cut, up to next)
    with BuildSketch(Plane.XY, mode=Mode.PRIVATE) as cut_extrude2_sk6:
        with Locations((12.7, 444.5)):
            Circle(SKETCH3_R)
    cut_extrude2_tool6 = extrude(cut_extrude2_sk6.sketch, amount=-CUT_EXTRUDE2_REACH, mode=Mode.PRIVATE) & part.part
    add(cut_extrude2_tool1.solids().sort_by_distance((12.7, 63.5, 0))[0], mode=Mode.SUBTRACT)
    add(cut_extrude2_tool2.solids().sort_by_distance((12.7, 139.7, 0))[0], mode=Mode.SUBTRACT)
    add(cut_extrude2_tool3.solids().sort_by_distance((12.7, 215.9, 0))[0], mode=Mode.SUBTRACT)
    add(cut_extrude2_tool4.solids().sort_by_distance((12.7, 292.1, 0))[0], mode=Mode.SUBTRACT)
    add(cut_extrude2_tool5.solids().sort_by_distance((12.7, 368.3, 0))[0], mode=Mode.SUBTRACT)
    add(cut_extrude2_tool6.solids().sort_by_distance((12.7, 444.5, 0))[0], mode=Mode.SUBTRACT)

    # Sketch4 → Cut-Extrude3 (cut, up to next)
    with BuildSketch(Plane.ZY, mode=Mode.PRIVATE) as cut_extrude3_sk1:
        with Locations((-38.110518668, 96.635101662)):
            Circle(SKETCH4_R)
    cut_extrude3_tool1 = extrude(cut_extrude3_sk1.sketch, amount=-CUT_EXTRUDE3_REACH, mode=Mode.PRIVATE) & part.part
    # Sketch4 → Cut-Extrude3 (cut, up to next)
    with BuildSketch(Plane.ZY, mode=Mode.PRIVATE) as cut_extrude3_sk2:
        with Locations((-38.110518668, 411.364898332)):
            Circle(SKETCH4_R)
    cut_extrude3_tool2 = extrude(cut_extrude3_sk2.sketch, amount=-CUT_EXTRUDE3_REACH, mode=Mode.PRIVATE) & part.part
    # Sketch4 → Cut-Extrude3 (cut, up to next)
    with BuildSketch(Plane.ZY, mode=Mode.PRIVATE) as cut_extrude3_sk3:
        with Locations((-12.710518668, 411.364898332)):
            Circle(SKETCH4_R)
    cut_extrude3_tool3 = extrude(cut_extrude3_sk3.sketch, amount=-CUT_EXTRUDE3_REACH, mode=Mode.PRIVATE) & part.part
    # Sketch4 → Cut-Extrude3 (cut, up to next)
    with BuildSketch(Plane.ZY, mode=Mode.PRIVATE) as cut_extrude3_sk4:
        with Locations((-12.710518668, 96.635101662)):
            Circle(SKETCH4_R)
    cut_extrude3_tool4 = extrude(cut_extrude3_sk4.sketch, amount=-CUT_EXTRUDE3_REACH, mode=Mode.PRIVATE) & part.part
    add(cut_extrude3_tool1.solids().sort_by_distance((0, 96.635102, -38.110519))[0], mode=Mode.SUBTRACT)
    add(cut_extrude3_tool2.solids().sort_by_distance((0, 411.364898, -38.110519))[0], mode=Mode.SUBTRACT)
    add(cut_extrude3_tool3.solids().sort_by_distance((0, 411.364898, -12.710519))[0], mode=Mode.SUBTRACT)
    add(cut_extrude3_tool4.solids().sort_by_distance((0, 96.635102, -12.710519))[0], mode=Mode.SUBTRACT)


solid = part.part
